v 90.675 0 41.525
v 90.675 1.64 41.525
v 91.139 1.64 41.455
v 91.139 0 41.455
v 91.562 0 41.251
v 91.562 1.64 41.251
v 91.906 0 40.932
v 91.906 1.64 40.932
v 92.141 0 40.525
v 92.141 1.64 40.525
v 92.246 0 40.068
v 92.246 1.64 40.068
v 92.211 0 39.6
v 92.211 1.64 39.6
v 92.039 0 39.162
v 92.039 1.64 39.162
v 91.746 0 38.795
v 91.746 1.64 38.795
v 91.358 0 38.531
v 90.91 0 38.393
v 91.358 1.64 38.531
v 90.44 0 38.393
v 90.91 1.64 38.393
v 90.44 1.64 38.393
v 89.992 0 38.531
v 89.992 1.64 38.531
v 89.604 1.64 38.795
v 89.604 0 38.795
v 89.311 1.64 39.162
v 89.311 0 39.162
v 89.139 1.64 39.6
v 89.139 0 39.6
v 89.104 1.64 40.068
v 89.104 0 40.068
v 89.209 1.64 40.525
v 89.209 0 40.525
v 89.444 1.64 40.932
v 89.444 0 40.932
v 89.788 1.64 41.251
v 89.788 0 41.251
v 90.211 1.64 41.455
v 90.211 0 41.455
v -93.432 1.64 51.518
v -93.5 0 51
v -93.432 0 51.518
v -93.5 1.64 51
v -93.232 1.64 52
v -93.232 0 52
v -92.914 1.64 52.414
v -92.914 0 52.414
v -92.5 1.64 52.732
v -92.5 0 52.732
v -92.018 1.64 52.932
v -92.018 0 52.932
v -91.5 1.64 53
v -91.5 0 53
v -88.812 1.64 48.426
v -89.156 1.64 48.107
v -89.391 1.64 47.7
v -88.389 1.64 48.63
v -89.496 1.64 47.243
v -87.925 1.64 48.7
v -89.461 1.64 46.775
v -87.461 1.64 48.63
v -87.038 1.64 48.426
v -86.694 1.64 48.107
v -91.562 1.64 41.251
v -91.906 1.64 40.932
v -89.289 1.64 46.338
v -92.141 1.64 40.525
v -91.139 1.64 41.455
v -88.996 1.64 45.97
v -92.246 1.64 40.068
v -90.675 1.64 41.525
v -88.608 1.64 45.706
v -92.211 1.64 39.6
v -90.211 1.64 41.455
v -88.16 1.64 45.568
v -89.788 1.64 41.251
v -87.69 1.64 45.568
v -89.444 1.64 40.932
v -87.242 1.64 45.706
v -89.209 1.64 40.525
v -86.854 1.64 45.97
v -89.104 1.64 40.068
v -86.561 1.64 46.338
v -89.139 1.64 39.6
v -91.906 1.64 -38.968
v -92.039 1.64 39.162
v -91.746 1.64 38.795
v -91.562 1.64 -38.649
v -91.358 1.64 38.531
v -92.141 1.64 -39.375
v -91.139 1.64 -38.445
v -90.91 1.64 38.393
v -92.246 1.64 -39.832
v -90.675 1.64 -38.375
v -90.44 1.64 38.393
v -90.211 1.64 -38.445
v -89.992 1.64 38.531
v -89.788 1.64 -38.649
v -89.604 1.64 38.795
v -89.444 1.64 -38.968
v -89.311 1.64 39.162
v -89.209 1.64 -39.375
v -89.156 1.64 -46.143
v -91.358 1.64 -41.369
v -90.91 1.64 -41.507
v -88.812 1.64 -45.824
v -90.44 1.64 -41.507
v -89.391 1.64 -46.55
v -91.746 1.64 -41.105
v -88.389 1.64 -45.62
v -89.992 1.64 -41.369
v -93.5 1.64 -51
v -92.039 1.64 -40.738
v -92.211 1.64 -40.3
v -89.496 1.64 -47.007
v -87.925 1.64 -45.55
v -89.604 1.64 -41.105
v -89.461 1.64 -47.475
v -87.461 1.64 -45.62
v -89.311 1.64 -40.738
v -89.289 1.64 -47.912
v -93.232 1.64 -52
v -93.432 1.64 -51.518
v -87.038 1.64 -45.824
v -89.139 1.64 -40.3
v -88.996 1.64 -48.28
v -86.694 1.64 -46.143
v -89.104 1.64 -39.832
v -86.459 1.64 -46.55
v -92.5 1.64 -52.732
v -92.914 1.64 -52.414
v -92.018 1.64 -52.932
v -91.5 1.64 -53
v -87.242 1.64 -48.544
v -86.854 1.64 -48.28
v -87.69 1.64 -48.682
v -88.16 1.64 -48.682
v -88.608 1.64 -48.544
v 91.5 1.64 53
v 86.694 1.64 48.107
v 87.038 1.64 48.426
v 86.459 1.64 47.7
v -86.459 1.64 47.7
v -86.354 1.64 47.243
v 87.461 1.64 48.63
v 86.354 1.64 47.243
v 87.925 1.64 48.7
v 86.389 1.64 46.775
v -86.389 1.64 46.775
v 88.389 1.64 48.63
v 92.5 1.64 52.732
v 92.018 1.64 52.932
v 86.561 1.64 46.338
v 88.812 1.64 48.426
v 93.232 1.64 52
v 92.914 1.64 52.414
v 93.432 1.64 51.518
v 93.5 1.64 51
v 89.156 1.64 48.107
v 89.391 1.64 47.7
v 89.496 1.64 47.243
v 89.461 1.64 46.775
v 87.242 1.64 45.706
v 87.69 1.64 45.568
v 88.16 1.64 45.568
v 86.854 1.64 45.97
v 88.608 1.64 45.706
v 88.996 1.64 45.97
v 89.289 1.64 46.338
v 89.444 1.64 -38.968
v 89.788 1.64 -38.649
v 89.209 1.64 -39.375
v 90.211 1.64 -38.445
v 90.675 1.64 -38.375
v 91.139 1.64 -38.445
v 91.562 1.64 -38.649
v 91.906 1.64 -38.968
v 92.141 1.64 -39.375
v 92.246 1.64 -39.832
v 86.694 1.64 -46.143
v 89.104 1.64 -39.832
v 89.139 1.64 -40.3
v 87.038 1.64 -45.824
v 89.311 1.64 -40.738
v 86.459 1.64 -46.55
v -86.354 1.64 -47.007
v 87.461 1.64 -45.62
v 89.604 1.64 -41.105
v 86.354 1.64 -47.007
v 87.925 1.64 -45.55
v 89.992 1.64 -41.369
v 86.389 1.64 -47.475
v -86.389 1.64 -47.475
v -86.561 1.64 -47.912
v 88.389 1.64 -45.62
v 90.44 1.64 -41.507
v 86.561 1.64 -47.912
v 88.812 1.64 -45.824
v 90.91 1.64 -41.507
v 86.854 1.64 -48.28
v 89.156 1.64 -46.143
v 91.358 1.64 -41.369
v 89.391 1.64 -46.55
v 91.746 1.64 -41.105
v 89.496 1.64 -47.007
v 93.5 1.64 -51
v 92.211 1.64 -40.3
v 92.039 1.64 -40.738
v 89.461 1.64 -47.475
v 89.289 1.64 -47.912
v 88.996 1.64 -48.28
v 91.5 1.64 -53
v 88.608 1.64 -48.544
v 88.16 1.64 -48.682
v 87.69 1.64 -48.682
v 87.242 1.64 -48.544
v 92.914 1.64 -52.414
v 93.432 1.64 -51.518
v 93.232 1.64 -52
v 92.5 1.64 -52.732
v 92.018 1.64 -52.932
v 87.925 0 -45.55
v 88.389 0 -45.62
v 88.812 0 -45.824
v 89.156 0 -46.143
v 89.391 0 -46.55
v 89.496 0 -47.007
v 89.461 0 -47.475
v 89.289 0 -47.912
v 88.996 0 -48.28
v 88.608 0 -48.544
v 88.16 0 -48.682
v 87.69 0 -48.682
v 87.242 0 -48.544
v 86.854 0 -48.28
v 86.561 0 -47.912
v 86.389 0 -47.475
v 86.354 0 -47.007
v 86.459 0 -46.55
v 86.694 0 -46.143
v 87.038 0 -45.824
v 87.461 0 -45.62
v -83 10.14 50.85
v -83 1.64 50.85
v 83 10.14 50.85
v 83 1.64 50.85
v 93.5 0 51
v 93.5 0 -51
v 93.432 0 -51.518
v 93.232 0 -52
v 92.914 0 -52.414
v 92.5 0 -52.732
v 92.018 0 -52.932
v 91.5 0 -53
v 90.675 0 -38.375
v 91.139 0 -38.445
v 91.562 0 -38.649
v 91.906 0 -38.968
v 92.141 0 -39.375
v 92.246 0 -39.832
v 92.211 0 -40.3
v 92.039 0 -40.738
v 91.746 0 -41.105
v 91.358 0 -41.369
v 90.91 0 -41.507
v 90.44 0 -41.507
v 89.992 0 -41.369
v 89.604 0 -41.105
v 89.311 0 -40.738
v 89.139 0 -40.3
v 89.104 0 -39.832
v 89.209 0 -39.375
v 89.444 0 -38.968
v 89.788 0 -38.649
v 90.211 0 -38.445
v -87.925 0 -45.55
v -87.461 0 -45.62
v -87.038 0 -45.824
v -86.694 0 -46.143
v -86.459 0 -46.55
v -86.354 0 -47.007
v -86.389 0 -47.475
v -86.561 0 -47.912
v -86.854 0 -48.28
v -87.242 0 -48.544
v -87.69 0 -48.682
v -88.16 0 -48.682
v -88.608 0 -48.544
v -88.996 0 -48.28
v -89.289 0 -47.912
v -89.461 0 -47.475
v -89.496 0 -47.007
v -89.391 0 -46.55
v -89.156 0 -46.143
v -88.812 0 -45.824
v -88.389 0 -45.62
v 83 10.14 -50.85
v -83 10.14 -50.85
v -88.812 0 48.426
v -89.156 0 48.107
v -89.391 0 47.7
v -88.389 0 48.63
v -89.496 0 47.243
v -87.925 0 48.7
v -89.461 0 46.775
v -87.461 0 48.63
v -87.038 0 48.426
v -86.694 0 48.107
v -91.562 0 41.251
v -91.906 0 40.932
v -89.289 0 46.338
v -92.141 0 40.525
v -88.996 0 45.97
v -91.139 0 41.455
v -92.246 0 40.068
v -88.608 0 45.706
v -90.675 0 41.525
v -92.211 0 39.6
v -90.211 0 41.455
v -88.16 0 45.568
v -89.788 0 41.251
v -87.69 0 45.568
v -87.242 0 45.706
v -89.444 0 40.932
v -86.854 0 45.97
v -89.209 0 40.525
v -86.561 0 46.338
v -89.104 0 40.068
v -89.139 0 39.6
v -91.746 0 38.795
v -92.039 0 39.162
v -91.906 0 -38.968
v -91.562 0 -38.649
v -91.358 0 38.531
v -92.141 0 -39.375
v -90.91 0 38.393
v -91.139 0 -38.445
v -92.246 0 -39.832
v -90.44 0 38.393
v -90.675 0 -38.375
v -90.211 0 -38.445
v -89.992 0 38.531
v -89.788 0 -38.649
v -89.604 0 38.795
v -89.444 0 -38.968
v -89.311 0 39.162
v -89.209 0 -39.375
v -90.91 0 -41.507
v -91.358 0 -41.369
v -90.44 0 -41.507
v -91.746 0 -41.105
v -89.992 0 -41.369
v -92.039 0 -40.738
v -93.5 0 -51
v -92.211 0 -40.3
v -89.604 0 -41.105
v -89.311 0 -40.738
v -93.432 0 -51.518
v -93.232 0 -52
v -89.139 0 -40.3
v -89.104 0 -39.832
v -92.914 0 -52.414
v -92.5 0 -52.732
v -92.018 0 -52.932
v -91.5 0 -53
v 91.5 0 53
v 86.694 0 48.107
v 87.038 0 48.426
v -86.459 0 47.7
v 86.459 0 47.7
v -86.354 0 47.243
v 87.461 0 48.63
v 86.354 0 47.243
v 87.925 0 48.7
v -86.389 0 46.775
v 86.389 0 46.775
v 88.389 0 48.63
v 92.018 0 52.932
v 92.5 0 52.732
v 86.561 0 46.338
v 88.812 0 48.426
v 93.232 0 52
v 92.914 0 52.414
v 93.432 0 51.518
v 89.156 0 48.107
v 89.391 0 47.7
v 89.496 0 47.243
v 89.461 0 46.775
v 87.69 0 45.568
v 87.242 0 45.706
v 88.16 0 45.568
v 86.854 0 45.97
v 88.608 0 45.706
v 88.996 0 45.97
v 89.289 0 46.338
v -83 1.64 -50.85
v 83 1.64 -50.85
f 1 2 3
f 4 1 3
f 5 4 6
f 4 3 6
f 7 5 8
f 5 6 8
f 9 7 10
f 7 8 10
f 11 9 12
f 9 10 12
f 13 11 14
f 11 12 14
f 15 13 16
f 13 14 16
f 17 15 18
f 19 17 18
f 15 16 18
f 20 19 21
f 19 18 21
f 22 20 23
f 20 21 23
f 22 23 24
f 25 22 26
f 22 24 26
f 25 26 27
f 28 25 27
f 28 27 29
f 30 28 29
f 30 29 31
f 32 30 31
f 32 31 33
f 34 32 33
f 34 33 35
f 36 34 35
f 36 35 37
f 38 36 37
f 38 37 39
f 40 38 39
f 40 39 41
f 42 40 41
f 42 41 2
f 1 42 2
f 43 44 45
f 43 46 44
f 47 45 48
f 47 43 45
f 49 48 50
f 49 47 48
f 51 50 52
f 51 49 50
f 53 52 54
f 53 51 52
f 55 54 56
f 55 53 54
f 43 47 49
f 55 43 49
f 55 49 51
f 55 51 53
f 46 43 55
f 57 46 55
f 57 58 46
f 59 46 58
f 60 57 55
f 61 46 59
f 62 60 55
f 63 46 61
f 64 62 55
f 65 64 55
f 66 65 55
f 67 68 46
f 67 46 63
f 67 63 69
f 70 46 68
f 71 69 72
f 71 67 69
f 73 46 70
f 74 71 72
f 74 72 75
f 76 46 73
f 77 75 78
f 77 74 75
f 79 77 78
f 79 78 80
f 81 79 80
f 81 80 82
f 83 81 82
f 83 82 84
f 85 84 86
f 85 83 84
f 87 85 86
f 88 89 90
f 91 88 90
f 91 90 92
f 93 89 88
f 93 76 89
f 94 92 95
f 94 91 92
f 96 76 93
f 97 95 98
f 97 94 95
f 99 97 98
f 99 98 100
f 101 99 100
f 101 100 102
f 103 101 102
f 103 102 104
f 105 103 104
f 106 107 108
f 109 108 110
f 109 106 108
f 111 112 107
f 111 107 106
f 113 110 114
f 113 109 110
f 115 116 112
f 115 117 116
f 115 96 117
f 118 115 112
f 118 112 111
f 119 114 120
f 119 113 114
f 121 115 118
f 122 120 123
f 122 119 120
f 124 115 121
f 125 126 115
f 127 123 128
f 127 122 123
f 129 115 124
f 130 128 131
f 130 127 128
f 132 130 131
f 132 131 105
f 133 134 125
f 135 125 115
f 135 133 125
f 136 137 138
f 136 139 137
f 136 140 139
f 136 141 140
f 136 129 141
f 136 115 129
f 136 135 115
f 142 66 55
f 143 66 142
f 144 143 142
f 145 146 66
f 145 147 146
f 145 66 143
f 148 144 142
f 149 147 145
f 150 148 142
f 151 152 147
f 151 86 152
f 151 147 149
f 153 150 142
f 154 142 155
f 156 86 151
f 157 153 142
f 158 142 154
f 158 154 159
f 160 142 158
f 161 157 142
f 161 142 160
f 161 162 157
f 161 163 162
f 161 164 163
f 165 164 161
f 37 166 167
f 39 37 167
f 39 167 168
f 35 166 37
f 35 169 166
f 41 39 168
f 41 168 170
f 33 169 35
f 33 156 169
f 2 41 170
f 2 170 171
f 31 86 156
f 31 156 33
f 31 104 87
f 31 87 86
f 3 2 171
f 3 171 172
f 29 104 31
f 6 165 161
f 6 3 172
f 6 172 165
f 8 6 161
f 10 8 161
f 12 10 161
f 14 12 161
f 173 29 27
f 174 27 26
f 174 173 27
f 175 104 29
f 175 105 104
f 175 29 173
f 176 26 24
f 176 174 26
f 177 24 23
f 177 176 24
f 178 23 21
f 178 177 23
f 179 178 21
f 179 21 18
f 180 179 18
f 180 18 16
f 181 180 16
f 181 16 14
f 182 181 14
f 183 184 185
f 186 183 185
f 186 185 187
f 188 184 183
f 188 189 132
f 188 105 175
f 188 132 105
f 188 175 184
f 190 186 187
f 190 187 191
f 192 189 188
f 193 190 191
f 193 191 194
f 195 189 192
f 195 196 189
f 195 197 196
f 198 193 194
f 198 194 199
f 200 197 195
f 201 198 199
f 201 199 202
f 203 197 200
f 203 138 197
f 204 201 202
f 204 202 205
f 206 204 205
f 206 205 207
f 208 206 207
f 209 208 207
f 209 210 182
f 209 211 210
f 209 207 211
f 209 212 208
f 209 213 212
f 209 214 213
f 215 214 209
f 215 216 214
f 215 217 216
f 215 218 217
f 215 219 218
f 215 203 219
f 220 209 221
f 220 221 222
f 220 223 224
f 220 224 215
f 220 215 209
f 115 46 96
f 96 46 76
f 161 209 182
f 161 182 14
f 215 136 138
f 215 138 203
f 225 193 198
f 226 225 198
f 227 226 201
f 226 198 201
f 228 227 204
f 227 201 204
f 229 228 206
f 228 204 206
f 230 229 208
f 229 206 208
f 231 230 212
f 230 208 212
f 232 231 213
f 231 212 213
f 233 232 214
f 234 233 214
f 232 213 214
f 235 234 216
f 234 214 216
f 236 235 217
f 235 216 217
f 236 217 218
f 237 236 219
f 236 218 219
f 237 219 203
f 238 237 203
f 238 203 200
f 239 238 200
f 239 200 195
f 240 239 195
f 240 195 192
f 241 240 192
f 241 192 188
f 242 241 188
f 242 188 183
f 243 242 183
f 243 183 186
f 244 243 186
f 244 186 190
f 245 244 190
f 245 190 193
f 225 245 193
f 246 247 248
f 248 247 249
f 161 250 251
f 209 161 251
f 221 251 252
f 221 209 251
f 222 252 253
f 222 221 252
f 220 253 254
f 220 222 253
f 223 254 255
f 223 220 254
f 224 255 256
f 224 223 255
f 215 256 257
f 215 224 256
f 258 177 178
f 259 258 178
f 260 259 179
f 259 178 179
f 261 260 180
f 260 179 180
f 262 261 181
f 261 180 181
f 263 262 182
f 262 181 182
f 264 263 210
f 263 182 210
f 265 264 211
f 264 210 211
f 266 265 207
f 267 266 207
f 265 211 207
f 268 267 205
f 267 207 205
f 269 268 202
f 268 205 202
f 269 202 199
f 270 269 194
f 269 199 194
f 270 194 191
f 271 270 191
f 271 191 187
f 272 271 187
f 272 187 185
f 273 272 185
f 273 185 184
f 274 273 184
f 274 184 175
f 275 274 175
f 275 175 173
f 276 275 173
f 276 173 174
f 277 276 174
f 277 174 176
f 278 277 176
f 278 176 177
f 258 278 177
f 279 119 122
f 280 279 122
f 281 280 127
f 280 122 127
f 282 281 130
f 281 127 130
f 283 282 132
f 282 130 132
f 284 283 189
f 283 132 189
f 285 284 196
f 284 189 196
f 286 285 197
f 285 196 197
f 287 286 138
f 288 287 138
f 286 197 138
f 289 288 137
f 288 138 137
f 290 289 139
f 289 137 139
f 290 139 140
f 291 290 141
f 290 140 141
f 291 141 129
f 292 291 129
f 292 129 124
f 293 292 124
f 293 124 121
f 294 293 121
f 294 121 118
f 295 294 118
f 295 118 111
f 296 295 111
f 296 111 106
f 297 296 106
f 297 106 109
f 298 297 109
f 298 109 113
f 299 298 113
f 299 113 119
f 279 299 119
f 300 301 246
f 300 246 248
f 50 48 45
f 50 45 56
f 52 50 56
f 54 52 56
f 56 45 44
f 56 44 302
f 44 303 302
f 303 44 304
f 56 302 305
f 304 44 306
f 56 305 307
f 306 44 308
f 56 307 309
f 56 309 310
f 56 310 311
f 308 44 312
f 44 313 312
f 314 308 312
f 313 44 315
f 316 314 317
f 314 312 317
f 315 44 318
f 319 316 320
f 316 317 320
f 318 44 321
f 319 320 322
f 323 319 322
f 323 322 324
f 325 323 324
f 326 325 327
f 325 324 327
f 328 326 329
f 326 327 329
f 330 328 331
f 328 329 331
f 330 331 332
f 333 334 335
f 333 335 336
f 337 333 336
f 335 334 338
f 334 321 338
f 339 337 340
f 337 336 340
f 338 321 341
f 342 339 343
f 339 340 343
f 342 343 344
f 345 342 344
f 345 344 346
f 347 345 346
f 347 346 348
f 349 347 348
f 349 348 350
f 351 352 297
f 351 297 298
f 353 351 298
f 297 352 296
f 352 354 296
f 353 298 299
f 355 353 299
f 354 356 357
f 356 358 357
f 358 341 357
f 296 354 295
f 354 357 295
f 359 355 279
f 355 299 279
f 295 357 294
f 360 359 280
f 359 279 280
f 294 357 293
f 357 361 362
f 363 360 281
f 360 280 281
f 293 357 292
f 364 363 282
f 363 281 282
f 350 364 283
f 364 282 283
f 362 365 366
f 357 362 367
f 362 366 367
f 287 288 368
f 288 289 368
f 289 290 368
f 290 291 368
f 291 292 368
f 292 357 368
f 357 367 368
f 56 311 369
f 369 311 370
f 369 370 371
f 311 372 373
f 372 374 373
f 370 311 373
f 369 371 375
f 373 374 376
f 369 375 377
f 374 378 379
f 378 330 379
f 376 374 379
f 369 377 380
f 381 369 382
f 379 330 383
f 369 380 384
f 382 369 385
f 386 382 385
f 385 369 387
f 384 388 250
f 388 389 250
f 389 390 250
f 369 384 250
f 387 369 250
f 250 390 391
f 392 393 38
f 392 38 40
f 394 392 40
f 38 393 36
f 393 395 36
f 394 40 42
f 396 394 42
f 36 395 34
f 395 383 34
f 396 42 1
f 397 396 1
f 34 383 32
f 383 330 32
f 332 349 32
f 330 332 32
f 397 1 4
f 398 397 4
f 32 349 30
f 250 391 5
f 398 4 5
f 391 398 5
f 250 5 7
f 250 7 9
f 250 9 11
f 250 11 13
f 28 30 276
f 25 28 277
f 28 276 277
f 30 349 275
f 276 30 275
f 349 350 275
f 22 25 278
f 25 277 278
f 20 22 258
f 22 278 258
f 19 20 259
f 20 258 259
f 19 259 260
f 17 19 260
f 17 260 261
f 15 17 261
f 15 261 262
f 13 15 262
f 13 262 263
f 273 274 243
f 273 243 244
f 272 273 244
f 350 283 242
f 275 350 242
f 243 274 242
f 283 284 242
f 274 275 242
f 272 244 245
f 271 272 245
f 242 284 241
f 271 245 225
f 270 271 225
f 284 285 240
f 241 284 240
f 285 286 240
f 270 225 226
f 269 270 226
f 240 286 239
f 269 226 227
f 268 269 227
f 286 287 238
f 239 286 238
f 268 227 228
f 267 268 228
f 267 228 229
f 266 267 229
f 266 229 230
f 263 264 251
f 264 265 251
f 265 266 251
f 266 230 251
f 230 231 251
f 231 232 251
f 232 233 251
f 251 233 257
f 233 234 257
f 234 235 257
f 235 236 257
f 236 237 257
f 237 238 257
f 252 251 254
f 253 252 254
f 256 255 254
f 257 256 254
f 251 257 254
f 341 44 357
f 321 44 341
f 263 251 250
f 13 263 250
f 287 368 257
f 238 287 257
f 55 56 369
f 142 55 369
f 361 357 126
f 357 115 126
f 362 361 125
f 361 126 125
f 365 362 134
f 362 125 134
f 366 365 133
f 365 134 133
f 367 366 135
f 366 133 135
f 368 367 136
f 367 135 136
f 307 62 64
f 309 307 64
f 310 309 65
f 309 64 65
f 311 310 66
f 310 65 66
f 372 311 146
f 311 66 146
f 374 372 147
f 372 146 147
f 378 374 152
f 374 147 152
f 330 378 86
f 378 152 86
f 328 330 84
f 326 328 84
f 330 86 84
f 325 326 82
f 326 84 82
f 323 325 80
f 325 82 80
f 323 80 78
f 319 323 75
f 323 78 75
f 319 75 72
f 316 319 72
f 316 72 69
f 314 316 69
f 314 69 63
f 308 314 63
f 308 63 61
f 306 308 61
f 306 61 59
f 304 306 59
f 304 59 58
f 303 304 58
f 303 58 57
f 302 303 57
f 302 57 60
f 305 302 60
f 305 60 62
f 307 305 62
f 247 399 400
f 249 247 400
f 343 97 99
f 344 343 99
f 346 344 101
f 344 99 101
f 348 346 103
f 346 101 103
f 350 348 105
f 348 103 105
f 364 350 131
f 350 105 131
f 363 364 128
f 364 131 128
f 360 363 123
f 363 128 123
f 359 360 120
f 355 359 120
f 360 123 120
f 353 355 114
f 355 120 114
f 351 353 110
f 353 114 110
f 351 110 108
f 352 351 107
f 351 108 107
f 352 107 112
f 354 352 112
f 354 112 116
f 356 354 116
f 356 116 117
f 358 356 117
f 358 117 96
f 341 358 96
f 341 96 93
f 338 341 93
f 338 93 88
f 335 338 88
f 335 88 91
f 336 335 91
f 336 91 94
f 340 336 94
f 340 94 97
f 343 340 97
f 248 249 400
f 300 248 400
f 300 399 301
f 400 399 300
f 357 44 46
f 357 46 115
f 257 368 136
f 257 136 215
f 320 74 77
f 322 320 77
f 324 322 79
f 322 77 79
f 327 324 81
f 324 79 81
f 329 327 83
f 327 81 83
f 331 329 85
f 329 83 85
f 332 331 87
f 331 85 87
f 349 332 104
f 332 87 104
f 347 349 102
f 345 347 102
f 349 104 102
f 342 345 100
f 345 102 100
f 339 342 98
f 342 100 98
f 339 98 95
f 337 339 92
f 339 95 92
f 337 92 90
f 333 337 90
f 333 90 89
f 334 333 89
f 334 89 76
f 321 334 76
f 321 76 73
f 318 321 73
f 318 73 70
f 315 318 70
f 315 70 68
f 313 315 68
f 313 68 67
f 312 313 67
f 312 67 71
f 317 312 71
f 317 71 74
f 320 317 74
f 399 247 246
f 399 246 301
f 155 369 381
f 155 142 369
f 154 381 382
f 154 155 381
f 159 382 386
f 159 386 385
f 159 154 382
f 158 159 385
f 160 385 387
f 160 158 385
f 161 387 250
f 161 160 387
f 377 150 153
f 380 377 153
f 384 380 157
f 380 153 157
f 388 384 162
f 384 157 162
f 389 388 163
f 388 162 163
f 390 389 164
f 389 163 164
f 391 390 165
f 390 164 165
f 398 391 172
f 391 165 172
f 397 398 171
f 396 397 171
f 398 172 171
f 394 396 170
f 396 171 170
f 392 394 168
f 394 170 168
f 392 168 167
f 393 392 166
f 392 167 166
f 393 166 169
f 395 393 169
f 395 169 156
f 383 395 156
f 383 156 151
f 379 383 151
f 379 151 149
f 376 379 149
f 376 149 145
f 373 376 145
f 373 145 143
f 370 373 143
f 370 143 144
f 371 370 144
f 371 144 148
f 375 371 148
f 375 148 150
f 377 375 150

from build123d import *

# Parameters (mm, degrees)
SKETCH1_W      = 187
SKETCH1_H      = 106
EXTRUDE1_DEPTH = 1.64
SKETCH2_W      = 166
SKETCH2_H      = 101.7
EXTRUDE2_DEPTH = 8.5
FILLET1_R      = 2
SKETCH3_R      = 1.575
EXTRUDE3_DEPTH = 8.5


with BuildPart() as part:
    # Sketch1 → Extrude1 (new body)
    with BuildSketch(Plane(origin=(0, 0, 0), x_dir=(1, 0, 0), z_dir=(0, 1, 0))):
        Rectangle(SKETCH1_W, SKETCH1_H)
    extrude(amount=EXTRUDE1_DEPTH)

    # Fillet1
    fillet1_edges = [part.edges().sort_by_distance(p)[0] for p in [
        (-93.5, 0.82, -53),
        (93.5, 0.82, -53),
        (93.5, 0.82, 53),
        (-93.5, 0.82, 53),
    ]]
    fillet(fillet1_edges, radius=FILLET1_R)

    # Sketch3 → Extrude3 (cut)
    with BuildSketch(Plane(origin=(0, 1.64, 0), x_dir=(1, 0, 0), z_dir=(0, 1, 0))):
        with Locations(Location((87.925, 47.125, 0), (0, 0, 270))):
            Circle(SKETCH3_R)
        with Locations(Location((90.675, 39.95, 0), (0, 0, 270))):
            Circle(SKETCH3_R)
        with Locations(Location((90.675, -39.95, 0), (0, 0, 270))):
            Circle(SKETCH3_R)
        with Locations(Location((87.925, -47.125, 0), (0, 0, 270))):
            Circle(SKETCH3_R)
        with Locations(Location((-87.925, -47.125, 0), (0, 0, 270))):
            Circle(SKETCH3_R)
        with Locations(Location((-90.675, -39.95, 0), (0, 0, 270))):
            Circle(SKETCH3_R)
        with Locations(Location((-87.925, 47.125, 0), (0, 0, 270))):
            Circle(SKETCH3_R)
        with Locations(Location((-90.675, 39.95, 0), (0, 0, 270))):
            Circle(SKETCH3_R)
    extrude(amount=-EXTRUDE3_DEPTH, mode=Mode.SUBTRACT)


with BuildPart() as body_2:
    # Sketch2 → Extrude2 (new body)
    with BuildSketch(Plane(origin=(0, 1.64, 0), x_dir=(1, 0, 0), z_dir=(0, 1, 0))):
        Rectangle(SKETCH2_W, SKETCH2_H)
    extrude(amount=EXTRUDE2_DEPTH)


solid = Compound([part.part, body_2.part])
